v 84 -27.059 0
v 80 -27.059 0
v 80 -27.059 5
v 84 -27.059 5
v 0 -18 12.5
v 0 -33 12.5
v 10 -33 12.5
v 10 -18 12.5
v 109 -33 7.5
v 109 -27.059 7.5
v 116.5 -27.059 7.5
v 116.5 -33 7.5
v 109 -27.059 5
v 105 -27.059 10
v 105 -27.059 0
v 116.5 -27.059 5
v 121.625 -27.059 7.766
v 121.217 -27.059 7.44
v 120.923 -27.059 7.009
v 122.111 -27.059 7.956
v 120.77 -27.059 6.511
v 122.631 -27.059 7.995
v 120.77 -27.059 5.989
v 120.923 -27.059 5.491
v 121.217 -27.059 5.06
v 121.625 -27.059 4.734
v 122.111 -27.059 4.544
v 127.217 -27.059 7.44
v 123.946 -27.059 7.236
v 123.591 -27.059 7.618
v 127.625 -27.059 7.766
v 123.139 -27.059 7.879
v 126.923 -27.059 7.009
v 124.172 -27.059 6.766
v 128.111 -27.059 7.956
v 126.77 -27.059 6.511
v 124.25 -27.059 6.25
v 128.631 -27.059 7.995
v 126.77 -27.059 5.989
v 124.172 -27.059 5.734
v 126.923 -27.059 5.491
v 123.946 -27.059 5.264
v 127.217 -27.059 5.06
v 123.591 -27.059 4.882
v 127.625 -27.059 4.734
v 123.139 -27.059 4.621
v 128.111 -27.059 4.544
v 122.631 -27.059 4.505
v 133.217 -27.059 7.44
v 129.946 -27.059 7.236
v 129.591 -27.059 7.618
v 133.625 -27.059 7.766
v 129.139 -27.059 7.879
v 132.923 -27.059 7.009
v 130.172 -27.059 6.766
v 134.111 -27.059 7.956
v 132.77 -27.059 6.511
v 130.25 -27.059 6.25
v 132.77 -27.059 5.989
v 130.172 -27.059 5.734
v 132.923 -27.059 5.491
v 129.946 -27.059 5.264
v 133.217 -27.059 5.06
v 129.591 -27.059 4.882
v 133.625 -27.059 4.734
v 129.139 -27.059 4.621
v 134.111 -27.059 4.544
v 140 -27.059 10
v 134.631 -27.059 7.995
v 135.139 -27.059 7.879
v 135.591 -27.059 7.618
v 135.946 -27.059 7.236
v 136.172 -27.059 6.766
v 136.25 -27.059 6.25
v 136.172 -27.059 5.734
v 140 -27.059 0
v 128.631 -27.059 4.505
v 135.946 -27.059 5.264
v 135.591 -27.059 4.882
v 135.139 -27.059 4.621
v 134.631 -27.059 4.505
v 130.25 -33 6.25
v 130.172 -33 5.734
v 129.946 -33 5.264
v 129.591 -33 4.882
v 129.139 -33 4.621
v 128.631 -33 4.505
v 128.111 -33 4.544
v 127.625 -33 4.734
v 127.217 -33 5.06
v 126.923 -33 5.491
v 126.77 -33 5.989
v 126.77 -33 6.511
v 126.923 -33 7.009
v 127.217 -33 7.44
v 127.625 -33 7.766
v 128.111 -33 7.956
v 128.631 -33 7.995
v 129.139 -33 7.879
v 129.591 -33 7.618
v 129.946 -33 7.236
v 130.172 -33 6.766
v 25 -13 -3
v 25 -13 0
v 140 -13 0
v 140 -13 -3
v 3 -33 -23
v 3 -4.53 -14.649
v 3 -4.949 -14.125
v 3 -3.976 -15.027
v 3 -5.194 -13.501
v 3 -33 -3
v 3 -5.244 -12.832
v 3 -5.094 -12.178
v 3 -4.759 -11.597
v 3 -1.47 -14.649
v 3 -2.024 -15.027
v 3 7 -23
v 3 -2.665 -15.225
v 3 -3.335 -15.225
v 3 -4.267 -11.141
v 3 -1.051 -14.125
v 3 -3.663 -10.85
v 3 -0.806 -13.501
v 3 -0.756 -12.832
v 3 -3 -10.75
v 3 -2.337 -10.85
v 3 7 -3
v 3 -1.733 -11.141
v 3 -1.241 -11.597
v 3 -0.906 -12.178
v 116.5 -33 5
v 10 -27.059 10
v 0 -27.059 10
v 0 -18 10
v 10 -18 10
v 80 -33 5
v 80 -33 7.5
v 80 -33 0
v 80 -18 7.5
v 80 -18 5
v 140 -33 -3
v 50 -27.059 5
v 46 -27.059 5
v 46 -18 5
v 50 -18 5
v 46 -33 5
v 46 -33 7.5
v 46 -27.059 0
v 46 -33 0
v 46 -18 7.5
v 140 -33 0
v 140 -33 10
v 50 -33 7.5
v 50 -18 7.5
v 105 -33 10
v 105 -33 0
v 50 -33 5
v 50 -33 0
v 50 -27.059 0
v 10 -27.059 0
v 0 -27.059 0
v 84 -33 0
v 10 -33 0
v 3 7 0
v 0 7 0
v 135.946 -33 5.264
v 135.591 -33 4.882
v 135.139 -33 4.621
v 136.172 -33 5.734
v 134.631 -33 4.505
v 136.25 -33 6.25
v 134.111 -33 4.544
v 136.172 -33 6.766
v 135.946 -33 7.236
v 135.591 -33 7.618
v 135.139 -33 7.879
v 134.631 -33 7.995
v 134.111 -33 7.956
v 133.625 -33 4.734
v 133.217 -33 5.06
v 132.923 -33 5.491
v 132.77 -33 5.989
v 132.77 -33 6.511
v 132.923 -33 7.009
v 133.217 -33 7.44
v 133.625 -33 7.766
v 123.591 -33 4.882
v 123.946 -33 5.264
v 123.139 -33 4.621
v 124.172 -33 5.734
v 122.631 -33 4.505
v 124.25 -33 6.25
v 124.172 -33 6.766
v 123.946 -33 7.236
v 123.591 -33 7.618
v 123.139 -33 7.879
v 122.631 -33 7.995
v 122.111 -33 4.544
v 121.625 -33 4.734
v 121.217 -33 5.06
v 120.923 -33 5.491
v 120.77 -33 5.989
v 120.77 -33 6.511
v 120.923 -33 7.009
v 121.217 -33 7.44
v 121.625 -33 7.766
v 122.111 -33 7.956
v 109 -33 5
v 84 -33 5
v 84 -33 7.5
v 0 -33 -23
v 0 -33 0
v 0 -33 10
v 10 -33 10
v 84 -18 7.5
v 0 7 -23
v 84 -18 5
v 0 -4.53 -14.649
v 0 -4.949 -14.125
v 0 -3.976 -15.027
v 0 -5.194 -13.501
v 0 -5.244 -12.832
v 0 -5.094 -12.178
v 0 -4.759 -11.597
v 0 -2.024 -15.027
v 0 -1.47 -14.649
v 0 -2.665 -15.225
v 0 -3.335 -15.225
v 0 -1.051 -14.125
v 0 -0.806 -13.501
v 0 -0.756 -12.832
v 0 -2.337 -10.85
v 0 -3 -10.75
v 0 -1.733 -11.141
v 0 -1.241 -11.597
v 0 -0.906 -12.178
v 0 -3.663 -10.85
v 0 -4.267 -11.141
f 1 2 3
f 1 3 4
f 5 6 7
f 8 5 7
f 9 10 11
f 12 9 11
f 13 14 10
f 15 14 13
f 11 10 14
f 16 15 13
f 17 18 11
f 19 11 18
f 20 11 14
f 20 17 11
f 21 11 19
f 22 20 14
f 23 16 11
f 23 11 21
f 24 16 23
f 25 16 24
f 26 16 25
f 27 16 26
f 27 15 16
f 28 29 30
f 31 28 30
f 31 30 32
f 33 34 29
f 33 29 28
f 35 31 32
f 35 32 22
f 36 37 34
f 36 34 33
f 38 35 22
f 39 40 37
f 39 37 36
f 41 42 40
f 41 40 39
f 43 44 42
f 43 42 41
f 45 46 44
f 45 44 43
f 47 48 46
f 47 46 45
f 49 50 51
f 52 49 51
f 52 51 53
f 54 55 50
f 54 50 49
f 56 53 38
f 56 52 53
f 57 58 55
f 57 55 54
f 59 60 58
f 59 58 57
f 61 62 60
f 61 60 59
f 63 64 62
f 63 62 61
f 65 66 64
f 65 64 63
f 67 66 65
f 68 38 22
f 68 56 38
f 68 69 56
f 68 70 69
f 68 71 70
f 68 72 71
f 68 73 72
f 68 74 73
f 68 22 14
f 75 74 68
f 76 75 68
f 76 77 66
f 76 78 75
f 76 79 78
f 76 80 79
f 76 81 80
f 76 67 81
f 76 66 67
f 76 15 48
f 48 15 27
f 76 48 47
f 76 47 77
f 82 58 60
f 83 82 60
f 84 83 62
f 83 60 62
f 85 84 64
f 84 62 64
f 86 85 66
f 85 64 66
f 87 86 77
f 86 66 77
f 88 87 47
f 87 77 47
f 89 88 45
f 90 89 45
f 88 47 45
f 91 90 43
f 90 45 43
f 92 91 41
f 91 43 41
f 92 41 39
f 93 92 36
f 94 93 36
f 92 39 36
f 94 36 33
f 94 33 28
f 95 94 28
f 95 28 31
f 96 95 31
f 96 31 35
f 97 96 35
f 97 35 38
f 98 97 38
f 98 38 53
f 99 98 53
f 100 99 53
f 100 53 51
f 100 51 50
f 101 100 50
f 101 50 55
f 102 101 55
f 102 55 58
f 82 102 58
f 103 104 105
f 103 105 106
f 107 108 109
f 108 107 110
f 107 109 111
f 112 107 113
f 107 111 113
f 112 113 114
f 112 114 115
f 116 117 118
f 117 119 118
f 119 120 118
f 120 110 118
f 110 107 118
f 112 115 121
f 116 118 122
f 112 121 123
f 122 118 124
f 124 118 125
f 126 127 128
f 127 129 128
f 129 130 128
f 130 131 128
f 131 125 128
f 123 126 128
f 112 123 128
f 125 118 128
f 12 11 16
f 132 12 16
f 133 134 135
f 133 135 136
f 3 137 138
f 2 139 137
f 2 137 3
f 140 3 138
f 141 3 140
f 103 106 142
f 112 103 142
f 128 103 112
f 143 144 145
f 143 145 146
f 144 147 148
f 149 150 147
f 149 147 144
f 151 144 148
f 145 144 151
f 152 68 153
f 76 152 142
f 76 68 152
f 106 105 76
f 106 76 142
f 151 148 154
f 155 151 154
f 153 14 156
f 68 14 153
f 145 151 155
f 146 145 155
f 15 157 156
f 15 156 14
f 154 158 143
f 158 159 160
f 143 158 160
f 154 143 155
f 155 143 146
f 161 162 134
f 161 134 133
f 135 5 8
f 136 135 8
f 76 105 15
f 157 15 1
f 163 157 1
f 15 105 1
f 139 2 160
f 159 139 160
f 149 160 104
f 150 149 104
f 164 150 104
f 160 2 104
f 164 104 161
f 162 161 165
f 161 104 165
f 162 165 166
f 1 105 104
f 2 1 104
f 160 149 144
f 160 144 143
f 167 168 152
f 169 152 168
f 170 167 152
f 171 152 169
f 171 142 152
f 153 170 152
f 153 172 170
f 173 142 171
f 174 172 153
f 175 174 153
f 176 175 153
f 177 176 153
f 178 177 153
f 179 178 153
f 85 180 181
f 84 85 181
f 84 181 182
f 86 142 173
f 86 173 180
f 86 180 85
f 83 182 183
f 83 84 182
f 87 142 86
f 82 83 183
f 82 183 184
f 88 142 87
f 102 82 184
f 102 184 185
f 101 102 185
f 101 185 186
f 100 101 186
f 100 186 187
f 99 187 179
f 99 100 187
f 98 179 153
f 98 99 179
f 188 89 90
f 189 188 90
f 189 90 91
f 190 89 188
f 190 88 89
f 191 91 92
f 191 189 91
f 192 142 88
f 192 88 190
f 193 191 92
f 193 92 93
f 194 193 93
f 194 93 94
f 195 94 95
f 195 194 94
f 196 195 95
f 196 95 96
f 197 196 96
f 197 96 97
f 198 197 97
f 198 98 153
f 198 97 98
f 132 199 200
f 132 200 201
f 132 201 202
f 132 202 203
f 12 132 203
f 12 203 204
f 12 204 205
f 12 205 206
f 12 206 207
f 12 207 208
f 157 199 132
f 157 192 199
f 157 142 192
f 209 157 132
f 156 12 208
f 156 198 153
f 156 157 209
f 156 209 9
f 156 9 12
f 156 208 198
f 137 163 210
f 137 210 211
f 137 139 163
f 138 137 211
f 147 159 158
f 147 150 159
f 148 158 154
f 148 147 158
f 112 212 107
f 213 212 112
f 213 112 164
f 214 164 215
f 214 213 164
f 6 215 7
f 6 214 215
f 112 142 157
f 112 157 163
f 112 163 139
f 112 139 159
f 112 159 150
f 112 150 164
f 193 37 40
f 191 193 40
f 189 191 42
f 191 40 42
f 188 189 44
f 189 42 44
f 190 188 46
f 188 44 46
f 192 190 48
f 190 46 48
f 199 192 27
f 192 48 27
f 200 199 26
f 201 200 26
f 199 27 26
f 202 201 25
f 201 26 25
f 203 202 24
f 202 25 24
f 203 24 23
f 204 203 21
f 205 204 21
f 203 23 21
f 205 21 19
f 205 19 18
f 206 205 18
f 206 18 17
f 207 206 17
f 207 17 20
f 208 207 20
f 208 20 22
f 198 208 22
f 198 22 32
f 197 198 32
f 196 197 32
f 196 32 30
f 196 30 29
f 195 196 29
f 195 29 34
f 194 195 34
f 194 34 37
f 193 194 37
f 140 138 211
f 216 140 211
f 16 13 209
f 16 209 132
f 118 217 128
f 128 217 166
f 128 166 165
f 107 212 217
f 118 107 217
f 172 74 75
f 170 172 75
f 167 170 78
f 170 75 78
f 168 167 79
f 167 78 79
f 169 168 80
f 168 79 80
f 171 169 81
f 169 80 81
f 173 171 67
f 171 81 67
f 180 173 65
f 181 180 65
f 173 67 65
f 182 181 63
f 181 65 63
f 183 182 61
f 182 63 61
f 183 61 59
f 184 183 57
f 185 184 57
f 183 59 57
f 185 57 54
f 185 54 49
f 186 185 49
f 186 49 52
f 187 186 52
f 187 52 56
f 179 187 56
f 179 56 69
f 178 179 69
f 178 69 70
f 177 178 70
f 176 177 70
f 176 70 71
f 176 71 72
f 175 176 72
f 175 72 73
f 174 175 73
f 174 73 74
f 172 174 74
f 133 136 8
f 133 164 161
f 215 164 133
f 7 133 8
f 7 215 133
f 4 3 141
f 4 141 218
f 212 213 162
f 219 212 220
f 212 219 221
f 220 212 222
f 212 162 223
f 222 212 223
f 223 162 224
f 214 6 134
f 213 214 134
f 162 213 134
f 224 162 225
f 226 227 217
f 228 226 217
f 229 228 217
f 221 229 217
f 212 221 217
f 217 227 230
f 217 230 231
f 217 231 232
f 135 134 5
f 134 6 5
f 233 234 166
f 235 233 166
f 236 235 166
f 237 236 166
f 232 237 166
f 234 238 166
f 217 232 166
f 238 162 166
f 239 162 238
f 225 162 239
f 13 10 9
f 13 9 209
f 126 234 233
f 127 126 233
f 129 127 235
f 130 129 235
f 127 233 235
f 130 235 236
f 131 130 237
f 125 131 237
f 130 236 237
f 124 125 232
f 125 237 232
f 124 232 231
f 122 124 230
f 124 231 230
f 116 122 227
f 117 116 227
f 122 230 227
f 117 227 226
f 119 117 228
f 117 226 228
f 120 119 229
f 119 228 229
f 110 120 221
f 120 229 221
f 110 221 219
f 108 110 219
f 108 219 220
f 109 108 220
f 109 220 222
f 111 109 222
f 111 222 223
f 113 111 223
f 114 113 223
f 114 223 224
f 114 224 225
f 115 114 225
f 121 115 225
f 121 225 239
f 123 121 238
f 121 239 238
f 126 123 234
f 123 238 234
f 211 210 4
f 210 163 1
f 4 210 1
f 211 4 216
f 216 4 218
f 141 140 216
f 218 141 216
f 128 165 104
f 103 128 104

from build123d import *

# Parameters (mm, degrees)
SKETCH1_W           = 3
SKETCH1_H           = 20
BOSS_EXTRUDE1_DEPTH = 140
SKETCH3_W           = 10
SKETCH3_H           = 5.940571325
SKETCH3_W_2         = 4
SKETCH3_W_3         = 35
BOSS_EXTRUDE2_DEPTH = 10
SKETCH5_W           = 38
SKETCH5_H           = 5
CUT_EXTRUDE2_DEPTH  = 15
SKETCH6_W           = 10
SKETCH6_H           = 2.5
SKETCH6_W_2         = 4
BOSS_EXTRUDE4_DEPTH = 15
SKETCH7_R           = 1.75
SKETCH7_W           = 7.5
SKETCH7_H           = 2.5
CUT_EXTRUDE3_DEPTH  = 15
SKETCH9_W           = 20
SKETCH9_H           = 40
SKETCH9_R           = 2.25
BOSS_EXTRUDE5_DEPTH = 3
BOSS_EXTRUDE6_DEPTH = 3


with BuildPart() as part:
    # Sketch1 → Boss-Extrude1 (new body)
    with BuildSketch(Plane(origin=(0, 0, 0), x_dir=(0, 0, -1), z_dir=(1, 0, 0))):
        with Locations((1.5, -23)):
            Rectangle(SKETCH1_W, SKETCH1_H)
    extrude(amount=BOSS_EXTRUDE1_DEPTH)

    # Sketch3 → Boss-Extrude2 (add)
    with BuildSketch(Plane.XY):
        with Locations((5, -30.029714338)):
            Rectangle(SKETCH3_W, SKETCH3_H)
        with Locations((48, -30.029714338)):
            Rectangle(SKETCH3_W_2, SKETCH3_H)
        with Locations((82, -30.029714338)):
            Rectangle(SKETCH3_W_2, SKETCH3_H)
        with Locations((122.5, -30.029714338)):
            Rectangle(SKETCH3_W_3, SKETCH3_H)
    extrude(amount=BOSS_EXTRUDE2_DEPTH)

    # Sketch5 → Cut-Extrude2 (cut)
    with BuildSketch(Plane.XZ.offset(33)):
        with Locations((65, 7.5)):
            Rectangle(SKETCH5_W, SKETCH5_H)
    extrude(amount=-CUT_EXTRUDE2_DEPTH, mode=Mode.SUBTRACT)

    # Sketch6 → Boss-Extrude4 (add)
    with BuildSketch(Plane.XZ.offset(33)):
        with Locations((5, 11.25)):
            Rectangle(SKETCH6_W, SKETCH6_H)
        with Locations((48, 6.25)):
            Rectangle(SKETCH6_W_2, SKETCH6_H)
        with Locations((82, 6.25)):
            Rectangle(SKETCH6_W_2, SKETCH6_H)
    extrude(amount=-BOSS_EXTRUDE4_DEPTH)

    # Sketch7 → Cut-Extrude3 (cut)
    with BuildSketch(Plane(origin=(0, -27.059428675, 0), x_dir=(1, 0, 0), z_dir=(0, 1, 0))):
        with Locations((128.5, -6.25)):
            Circle(SKETCH7_R)
        with Locations((122.5, -6.25)):
            Circle(SKETCH7_R)
        with Locations((134.5, -6.25)):
            Circle(SKETCH7_R)
        with Locations((112.75, -6.25)):
            Rectangle(SKETCH7_W, SKETCH7_H)
    extrude(amount=-CUT_EXTRUDE3_DEPTH, mode=Mode.SUBTRACT)

    # Sketch9 → Boss-Extrude5 (add)
    with BuildSketch(Plane.ZY):
        with Locations((-13, -13)):
            Rectangle(SKETCH9_W, SKETCH9_H)
        with Locations((-13, -3)):
            Circle(SKETCH9_R, mode=Mode.SUBTRACT)
    extrude(amount=-BOSS_EXTRUDE5_DEPTH)

    # Sketch10 → Boss-Extrude6 (add)
    with BuildSketch(Plane.XY):
        Polygon((0, 7), (3, 7), (25, -13), (0, -13), align=None)
    extrude(amount=-BOSS_EXTRUDE6_DEPTH)


solid = part.part
